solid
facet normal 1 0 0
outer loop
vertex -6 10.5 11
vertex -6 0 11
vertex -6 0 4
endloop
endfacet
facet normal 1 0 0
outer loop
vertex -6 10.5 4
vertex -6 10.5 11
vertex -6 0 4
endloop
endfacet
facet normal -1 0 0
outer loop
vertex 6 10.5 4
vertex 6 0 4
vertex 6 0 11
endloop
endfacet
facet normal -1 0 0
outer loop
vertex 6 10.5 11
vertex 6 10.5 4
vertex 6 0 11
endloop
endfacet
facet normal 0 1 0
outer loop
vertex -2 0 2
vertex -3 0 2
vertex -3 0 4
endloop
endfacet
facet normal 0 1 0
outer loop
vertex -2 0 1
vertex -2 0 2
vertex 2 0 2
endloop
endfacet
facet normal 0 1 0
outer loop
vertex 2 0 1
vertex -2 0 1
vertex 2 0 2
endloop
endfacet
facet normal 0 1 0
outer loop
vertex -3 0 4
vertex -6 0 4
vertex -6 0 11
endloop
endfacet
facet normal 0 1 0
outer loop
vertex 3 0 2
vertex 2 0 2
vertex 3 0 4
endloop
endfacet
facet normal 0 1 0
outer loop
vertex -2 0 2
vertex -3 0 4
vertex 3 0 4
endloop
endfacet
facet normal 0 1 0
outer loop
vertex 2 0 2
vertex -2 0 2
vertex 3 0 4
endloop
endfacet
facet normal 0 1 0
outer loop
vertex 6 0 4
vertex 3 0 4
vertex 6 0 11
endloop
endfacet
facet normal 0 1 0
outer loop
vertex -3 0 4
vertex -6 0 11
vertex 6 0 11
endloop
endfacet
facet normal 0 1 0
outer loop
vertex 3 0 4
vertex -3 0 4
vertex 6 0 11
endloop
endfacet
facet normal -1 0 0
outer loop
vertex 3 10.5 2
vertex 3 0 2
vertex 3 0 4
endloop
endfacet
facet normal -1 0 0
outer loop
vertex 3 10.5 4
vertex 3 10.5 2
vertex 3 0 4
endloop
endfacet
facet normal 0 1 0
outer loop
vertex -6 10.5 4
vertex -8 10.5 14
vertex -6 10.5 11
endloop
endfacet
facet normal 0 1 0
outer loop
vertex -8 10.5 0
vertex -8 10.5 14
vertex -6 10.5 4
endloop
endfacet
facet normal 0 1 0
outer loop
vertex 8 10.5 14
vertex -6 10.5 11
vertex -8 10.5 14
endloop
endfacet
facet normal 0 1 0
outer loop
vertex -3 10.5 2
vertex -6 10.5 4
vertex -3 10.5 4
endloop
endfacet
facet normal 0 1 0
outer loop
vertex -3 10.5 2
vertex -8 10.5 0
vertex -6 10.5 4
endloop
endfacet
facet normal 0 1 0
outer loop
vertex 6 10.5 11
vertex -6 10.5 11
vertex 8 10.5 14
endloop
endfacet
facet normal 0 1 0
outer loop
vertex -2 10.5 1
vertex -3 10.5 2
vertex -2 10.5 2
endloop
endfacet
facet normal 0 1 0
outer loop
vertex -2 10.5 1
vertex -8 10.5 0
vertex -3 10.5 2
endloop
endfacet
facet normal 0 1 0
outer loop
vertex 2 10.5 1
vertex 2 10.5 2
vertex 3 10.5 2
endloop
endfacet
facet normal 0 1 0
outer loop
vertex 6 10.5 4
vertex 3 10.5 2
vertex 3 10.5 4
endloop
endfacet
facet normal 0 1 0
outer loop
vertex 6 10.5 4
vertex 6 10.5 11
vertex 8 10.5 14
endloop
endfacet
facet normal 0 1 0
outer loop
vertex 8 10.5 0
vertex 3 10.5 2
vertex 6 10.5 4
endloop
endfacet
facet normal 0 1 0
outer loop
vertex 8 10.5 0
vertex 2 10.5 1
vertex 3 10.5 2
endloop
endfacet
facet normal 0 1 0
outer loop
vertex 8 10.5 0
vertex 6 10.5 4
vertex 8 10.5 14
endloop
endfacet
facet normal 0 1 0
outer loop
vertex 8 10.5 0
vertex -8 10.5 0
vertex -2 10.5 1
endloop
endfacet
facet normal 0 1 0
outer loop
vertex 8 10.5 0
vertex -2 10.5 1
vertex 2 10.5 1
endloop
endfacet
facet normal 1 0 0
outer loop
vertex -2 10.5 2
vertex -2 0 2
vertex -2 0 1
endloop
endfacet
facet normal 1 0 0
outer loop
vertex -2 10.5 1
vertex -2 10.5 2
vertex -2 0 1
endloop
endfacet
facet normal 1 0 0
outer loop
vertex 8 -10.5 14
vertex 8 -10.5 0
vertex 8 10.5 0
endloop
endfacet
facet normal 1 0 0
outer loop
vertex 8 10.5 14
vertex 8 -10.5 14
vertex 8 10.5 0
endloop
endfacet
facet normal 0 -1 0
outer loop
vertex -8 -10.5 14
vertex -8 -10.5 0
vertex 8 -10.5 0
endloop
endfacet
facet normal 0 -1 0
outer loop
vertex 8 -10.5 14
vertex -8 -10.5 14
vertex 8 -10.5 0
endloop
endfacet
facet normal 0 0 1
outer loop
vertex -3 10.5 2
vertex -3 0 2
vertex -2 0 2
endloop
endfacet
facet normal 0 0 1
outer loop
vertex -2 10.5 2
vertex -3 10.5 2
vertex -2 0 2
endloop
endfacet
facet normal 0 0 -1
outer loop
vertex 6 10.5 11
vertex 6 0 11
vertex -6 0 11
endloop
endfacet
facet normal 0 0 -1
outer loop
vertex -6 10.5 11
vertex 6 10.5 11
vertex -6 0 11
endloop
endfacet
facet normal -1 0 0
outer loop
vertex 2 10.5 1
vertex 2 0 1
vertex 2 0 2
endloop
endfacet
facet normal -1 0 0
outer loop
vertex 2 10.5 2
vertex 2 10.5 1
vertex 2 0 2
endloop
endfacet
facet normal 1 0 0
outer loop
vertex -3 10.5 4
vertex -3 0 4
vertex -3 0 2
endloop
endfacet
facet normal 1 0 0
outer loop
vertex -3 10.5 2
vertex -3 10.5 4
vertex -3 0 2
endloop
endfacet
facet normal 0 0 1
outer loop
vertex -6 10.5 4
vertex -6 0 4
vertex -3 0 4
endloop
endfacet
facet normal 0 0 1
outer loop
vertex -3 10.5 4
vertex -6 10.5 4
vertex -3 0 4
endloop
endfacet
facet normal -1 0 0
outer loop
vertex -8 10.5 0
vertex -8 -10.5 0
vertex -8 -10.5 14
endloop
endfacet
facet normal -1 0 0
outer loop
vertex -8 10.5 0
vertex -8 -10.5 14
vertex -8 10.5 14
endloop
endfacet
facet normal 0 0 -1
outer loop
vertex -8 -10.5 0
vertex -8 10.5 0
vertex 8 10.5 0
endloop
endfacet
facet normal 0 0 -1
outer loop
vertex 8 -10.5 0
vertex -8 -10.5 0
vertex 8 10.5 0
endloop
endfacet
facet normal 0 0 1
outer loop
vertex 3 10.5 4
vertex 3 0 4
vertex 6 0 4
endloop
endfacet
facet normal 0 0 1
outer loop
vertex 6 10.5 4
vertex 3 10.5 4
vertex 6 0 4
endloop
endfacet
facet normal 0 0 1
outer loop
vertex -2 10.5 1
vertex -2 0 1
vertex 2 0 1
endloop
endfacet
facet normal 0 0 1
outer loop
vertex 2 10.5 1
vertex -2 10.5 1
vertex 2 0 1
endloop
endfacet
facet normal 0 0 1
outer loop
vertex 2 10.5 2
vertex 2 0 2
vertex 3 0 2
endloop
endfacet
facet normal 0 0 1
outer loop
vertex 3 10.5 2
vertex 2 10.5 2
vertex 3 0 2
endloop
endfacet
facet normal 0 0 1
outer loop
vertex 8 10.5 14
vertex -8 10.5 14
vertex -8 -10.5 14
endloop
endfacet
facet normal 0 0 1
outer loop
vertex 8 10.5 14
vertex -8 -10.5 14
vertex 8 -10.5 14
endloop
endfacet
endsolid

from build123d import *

# Parameters (mm, degrees)
F0_W     = 16
F0_H     = 21
F1_DEPTH = 14
F3_DEPTH = 11


with BuildPart() as f1:
    # F0 (on Top) → F1 (new body)
    with BuildSketch(Plane.XY):
        Rectangle(F0_W, F0_H)
    extrude(amount=F1_DEPTH)

    # F2 (on Front) → F3 (cut)
    with BuildSketch(Plane.XZ):
        Polygon((-2, 2), (-2, 1), (2, 1), (2, 2), (3, 2), (3, 4), (6, 4), (6, 11), (-6, 11), (-6, 4), (-3, 4), (-3, 2), align=None)
    extrude(amount=-F3_DEPTH, mode=Mode.SUBTRACT)


solid = f1.part
